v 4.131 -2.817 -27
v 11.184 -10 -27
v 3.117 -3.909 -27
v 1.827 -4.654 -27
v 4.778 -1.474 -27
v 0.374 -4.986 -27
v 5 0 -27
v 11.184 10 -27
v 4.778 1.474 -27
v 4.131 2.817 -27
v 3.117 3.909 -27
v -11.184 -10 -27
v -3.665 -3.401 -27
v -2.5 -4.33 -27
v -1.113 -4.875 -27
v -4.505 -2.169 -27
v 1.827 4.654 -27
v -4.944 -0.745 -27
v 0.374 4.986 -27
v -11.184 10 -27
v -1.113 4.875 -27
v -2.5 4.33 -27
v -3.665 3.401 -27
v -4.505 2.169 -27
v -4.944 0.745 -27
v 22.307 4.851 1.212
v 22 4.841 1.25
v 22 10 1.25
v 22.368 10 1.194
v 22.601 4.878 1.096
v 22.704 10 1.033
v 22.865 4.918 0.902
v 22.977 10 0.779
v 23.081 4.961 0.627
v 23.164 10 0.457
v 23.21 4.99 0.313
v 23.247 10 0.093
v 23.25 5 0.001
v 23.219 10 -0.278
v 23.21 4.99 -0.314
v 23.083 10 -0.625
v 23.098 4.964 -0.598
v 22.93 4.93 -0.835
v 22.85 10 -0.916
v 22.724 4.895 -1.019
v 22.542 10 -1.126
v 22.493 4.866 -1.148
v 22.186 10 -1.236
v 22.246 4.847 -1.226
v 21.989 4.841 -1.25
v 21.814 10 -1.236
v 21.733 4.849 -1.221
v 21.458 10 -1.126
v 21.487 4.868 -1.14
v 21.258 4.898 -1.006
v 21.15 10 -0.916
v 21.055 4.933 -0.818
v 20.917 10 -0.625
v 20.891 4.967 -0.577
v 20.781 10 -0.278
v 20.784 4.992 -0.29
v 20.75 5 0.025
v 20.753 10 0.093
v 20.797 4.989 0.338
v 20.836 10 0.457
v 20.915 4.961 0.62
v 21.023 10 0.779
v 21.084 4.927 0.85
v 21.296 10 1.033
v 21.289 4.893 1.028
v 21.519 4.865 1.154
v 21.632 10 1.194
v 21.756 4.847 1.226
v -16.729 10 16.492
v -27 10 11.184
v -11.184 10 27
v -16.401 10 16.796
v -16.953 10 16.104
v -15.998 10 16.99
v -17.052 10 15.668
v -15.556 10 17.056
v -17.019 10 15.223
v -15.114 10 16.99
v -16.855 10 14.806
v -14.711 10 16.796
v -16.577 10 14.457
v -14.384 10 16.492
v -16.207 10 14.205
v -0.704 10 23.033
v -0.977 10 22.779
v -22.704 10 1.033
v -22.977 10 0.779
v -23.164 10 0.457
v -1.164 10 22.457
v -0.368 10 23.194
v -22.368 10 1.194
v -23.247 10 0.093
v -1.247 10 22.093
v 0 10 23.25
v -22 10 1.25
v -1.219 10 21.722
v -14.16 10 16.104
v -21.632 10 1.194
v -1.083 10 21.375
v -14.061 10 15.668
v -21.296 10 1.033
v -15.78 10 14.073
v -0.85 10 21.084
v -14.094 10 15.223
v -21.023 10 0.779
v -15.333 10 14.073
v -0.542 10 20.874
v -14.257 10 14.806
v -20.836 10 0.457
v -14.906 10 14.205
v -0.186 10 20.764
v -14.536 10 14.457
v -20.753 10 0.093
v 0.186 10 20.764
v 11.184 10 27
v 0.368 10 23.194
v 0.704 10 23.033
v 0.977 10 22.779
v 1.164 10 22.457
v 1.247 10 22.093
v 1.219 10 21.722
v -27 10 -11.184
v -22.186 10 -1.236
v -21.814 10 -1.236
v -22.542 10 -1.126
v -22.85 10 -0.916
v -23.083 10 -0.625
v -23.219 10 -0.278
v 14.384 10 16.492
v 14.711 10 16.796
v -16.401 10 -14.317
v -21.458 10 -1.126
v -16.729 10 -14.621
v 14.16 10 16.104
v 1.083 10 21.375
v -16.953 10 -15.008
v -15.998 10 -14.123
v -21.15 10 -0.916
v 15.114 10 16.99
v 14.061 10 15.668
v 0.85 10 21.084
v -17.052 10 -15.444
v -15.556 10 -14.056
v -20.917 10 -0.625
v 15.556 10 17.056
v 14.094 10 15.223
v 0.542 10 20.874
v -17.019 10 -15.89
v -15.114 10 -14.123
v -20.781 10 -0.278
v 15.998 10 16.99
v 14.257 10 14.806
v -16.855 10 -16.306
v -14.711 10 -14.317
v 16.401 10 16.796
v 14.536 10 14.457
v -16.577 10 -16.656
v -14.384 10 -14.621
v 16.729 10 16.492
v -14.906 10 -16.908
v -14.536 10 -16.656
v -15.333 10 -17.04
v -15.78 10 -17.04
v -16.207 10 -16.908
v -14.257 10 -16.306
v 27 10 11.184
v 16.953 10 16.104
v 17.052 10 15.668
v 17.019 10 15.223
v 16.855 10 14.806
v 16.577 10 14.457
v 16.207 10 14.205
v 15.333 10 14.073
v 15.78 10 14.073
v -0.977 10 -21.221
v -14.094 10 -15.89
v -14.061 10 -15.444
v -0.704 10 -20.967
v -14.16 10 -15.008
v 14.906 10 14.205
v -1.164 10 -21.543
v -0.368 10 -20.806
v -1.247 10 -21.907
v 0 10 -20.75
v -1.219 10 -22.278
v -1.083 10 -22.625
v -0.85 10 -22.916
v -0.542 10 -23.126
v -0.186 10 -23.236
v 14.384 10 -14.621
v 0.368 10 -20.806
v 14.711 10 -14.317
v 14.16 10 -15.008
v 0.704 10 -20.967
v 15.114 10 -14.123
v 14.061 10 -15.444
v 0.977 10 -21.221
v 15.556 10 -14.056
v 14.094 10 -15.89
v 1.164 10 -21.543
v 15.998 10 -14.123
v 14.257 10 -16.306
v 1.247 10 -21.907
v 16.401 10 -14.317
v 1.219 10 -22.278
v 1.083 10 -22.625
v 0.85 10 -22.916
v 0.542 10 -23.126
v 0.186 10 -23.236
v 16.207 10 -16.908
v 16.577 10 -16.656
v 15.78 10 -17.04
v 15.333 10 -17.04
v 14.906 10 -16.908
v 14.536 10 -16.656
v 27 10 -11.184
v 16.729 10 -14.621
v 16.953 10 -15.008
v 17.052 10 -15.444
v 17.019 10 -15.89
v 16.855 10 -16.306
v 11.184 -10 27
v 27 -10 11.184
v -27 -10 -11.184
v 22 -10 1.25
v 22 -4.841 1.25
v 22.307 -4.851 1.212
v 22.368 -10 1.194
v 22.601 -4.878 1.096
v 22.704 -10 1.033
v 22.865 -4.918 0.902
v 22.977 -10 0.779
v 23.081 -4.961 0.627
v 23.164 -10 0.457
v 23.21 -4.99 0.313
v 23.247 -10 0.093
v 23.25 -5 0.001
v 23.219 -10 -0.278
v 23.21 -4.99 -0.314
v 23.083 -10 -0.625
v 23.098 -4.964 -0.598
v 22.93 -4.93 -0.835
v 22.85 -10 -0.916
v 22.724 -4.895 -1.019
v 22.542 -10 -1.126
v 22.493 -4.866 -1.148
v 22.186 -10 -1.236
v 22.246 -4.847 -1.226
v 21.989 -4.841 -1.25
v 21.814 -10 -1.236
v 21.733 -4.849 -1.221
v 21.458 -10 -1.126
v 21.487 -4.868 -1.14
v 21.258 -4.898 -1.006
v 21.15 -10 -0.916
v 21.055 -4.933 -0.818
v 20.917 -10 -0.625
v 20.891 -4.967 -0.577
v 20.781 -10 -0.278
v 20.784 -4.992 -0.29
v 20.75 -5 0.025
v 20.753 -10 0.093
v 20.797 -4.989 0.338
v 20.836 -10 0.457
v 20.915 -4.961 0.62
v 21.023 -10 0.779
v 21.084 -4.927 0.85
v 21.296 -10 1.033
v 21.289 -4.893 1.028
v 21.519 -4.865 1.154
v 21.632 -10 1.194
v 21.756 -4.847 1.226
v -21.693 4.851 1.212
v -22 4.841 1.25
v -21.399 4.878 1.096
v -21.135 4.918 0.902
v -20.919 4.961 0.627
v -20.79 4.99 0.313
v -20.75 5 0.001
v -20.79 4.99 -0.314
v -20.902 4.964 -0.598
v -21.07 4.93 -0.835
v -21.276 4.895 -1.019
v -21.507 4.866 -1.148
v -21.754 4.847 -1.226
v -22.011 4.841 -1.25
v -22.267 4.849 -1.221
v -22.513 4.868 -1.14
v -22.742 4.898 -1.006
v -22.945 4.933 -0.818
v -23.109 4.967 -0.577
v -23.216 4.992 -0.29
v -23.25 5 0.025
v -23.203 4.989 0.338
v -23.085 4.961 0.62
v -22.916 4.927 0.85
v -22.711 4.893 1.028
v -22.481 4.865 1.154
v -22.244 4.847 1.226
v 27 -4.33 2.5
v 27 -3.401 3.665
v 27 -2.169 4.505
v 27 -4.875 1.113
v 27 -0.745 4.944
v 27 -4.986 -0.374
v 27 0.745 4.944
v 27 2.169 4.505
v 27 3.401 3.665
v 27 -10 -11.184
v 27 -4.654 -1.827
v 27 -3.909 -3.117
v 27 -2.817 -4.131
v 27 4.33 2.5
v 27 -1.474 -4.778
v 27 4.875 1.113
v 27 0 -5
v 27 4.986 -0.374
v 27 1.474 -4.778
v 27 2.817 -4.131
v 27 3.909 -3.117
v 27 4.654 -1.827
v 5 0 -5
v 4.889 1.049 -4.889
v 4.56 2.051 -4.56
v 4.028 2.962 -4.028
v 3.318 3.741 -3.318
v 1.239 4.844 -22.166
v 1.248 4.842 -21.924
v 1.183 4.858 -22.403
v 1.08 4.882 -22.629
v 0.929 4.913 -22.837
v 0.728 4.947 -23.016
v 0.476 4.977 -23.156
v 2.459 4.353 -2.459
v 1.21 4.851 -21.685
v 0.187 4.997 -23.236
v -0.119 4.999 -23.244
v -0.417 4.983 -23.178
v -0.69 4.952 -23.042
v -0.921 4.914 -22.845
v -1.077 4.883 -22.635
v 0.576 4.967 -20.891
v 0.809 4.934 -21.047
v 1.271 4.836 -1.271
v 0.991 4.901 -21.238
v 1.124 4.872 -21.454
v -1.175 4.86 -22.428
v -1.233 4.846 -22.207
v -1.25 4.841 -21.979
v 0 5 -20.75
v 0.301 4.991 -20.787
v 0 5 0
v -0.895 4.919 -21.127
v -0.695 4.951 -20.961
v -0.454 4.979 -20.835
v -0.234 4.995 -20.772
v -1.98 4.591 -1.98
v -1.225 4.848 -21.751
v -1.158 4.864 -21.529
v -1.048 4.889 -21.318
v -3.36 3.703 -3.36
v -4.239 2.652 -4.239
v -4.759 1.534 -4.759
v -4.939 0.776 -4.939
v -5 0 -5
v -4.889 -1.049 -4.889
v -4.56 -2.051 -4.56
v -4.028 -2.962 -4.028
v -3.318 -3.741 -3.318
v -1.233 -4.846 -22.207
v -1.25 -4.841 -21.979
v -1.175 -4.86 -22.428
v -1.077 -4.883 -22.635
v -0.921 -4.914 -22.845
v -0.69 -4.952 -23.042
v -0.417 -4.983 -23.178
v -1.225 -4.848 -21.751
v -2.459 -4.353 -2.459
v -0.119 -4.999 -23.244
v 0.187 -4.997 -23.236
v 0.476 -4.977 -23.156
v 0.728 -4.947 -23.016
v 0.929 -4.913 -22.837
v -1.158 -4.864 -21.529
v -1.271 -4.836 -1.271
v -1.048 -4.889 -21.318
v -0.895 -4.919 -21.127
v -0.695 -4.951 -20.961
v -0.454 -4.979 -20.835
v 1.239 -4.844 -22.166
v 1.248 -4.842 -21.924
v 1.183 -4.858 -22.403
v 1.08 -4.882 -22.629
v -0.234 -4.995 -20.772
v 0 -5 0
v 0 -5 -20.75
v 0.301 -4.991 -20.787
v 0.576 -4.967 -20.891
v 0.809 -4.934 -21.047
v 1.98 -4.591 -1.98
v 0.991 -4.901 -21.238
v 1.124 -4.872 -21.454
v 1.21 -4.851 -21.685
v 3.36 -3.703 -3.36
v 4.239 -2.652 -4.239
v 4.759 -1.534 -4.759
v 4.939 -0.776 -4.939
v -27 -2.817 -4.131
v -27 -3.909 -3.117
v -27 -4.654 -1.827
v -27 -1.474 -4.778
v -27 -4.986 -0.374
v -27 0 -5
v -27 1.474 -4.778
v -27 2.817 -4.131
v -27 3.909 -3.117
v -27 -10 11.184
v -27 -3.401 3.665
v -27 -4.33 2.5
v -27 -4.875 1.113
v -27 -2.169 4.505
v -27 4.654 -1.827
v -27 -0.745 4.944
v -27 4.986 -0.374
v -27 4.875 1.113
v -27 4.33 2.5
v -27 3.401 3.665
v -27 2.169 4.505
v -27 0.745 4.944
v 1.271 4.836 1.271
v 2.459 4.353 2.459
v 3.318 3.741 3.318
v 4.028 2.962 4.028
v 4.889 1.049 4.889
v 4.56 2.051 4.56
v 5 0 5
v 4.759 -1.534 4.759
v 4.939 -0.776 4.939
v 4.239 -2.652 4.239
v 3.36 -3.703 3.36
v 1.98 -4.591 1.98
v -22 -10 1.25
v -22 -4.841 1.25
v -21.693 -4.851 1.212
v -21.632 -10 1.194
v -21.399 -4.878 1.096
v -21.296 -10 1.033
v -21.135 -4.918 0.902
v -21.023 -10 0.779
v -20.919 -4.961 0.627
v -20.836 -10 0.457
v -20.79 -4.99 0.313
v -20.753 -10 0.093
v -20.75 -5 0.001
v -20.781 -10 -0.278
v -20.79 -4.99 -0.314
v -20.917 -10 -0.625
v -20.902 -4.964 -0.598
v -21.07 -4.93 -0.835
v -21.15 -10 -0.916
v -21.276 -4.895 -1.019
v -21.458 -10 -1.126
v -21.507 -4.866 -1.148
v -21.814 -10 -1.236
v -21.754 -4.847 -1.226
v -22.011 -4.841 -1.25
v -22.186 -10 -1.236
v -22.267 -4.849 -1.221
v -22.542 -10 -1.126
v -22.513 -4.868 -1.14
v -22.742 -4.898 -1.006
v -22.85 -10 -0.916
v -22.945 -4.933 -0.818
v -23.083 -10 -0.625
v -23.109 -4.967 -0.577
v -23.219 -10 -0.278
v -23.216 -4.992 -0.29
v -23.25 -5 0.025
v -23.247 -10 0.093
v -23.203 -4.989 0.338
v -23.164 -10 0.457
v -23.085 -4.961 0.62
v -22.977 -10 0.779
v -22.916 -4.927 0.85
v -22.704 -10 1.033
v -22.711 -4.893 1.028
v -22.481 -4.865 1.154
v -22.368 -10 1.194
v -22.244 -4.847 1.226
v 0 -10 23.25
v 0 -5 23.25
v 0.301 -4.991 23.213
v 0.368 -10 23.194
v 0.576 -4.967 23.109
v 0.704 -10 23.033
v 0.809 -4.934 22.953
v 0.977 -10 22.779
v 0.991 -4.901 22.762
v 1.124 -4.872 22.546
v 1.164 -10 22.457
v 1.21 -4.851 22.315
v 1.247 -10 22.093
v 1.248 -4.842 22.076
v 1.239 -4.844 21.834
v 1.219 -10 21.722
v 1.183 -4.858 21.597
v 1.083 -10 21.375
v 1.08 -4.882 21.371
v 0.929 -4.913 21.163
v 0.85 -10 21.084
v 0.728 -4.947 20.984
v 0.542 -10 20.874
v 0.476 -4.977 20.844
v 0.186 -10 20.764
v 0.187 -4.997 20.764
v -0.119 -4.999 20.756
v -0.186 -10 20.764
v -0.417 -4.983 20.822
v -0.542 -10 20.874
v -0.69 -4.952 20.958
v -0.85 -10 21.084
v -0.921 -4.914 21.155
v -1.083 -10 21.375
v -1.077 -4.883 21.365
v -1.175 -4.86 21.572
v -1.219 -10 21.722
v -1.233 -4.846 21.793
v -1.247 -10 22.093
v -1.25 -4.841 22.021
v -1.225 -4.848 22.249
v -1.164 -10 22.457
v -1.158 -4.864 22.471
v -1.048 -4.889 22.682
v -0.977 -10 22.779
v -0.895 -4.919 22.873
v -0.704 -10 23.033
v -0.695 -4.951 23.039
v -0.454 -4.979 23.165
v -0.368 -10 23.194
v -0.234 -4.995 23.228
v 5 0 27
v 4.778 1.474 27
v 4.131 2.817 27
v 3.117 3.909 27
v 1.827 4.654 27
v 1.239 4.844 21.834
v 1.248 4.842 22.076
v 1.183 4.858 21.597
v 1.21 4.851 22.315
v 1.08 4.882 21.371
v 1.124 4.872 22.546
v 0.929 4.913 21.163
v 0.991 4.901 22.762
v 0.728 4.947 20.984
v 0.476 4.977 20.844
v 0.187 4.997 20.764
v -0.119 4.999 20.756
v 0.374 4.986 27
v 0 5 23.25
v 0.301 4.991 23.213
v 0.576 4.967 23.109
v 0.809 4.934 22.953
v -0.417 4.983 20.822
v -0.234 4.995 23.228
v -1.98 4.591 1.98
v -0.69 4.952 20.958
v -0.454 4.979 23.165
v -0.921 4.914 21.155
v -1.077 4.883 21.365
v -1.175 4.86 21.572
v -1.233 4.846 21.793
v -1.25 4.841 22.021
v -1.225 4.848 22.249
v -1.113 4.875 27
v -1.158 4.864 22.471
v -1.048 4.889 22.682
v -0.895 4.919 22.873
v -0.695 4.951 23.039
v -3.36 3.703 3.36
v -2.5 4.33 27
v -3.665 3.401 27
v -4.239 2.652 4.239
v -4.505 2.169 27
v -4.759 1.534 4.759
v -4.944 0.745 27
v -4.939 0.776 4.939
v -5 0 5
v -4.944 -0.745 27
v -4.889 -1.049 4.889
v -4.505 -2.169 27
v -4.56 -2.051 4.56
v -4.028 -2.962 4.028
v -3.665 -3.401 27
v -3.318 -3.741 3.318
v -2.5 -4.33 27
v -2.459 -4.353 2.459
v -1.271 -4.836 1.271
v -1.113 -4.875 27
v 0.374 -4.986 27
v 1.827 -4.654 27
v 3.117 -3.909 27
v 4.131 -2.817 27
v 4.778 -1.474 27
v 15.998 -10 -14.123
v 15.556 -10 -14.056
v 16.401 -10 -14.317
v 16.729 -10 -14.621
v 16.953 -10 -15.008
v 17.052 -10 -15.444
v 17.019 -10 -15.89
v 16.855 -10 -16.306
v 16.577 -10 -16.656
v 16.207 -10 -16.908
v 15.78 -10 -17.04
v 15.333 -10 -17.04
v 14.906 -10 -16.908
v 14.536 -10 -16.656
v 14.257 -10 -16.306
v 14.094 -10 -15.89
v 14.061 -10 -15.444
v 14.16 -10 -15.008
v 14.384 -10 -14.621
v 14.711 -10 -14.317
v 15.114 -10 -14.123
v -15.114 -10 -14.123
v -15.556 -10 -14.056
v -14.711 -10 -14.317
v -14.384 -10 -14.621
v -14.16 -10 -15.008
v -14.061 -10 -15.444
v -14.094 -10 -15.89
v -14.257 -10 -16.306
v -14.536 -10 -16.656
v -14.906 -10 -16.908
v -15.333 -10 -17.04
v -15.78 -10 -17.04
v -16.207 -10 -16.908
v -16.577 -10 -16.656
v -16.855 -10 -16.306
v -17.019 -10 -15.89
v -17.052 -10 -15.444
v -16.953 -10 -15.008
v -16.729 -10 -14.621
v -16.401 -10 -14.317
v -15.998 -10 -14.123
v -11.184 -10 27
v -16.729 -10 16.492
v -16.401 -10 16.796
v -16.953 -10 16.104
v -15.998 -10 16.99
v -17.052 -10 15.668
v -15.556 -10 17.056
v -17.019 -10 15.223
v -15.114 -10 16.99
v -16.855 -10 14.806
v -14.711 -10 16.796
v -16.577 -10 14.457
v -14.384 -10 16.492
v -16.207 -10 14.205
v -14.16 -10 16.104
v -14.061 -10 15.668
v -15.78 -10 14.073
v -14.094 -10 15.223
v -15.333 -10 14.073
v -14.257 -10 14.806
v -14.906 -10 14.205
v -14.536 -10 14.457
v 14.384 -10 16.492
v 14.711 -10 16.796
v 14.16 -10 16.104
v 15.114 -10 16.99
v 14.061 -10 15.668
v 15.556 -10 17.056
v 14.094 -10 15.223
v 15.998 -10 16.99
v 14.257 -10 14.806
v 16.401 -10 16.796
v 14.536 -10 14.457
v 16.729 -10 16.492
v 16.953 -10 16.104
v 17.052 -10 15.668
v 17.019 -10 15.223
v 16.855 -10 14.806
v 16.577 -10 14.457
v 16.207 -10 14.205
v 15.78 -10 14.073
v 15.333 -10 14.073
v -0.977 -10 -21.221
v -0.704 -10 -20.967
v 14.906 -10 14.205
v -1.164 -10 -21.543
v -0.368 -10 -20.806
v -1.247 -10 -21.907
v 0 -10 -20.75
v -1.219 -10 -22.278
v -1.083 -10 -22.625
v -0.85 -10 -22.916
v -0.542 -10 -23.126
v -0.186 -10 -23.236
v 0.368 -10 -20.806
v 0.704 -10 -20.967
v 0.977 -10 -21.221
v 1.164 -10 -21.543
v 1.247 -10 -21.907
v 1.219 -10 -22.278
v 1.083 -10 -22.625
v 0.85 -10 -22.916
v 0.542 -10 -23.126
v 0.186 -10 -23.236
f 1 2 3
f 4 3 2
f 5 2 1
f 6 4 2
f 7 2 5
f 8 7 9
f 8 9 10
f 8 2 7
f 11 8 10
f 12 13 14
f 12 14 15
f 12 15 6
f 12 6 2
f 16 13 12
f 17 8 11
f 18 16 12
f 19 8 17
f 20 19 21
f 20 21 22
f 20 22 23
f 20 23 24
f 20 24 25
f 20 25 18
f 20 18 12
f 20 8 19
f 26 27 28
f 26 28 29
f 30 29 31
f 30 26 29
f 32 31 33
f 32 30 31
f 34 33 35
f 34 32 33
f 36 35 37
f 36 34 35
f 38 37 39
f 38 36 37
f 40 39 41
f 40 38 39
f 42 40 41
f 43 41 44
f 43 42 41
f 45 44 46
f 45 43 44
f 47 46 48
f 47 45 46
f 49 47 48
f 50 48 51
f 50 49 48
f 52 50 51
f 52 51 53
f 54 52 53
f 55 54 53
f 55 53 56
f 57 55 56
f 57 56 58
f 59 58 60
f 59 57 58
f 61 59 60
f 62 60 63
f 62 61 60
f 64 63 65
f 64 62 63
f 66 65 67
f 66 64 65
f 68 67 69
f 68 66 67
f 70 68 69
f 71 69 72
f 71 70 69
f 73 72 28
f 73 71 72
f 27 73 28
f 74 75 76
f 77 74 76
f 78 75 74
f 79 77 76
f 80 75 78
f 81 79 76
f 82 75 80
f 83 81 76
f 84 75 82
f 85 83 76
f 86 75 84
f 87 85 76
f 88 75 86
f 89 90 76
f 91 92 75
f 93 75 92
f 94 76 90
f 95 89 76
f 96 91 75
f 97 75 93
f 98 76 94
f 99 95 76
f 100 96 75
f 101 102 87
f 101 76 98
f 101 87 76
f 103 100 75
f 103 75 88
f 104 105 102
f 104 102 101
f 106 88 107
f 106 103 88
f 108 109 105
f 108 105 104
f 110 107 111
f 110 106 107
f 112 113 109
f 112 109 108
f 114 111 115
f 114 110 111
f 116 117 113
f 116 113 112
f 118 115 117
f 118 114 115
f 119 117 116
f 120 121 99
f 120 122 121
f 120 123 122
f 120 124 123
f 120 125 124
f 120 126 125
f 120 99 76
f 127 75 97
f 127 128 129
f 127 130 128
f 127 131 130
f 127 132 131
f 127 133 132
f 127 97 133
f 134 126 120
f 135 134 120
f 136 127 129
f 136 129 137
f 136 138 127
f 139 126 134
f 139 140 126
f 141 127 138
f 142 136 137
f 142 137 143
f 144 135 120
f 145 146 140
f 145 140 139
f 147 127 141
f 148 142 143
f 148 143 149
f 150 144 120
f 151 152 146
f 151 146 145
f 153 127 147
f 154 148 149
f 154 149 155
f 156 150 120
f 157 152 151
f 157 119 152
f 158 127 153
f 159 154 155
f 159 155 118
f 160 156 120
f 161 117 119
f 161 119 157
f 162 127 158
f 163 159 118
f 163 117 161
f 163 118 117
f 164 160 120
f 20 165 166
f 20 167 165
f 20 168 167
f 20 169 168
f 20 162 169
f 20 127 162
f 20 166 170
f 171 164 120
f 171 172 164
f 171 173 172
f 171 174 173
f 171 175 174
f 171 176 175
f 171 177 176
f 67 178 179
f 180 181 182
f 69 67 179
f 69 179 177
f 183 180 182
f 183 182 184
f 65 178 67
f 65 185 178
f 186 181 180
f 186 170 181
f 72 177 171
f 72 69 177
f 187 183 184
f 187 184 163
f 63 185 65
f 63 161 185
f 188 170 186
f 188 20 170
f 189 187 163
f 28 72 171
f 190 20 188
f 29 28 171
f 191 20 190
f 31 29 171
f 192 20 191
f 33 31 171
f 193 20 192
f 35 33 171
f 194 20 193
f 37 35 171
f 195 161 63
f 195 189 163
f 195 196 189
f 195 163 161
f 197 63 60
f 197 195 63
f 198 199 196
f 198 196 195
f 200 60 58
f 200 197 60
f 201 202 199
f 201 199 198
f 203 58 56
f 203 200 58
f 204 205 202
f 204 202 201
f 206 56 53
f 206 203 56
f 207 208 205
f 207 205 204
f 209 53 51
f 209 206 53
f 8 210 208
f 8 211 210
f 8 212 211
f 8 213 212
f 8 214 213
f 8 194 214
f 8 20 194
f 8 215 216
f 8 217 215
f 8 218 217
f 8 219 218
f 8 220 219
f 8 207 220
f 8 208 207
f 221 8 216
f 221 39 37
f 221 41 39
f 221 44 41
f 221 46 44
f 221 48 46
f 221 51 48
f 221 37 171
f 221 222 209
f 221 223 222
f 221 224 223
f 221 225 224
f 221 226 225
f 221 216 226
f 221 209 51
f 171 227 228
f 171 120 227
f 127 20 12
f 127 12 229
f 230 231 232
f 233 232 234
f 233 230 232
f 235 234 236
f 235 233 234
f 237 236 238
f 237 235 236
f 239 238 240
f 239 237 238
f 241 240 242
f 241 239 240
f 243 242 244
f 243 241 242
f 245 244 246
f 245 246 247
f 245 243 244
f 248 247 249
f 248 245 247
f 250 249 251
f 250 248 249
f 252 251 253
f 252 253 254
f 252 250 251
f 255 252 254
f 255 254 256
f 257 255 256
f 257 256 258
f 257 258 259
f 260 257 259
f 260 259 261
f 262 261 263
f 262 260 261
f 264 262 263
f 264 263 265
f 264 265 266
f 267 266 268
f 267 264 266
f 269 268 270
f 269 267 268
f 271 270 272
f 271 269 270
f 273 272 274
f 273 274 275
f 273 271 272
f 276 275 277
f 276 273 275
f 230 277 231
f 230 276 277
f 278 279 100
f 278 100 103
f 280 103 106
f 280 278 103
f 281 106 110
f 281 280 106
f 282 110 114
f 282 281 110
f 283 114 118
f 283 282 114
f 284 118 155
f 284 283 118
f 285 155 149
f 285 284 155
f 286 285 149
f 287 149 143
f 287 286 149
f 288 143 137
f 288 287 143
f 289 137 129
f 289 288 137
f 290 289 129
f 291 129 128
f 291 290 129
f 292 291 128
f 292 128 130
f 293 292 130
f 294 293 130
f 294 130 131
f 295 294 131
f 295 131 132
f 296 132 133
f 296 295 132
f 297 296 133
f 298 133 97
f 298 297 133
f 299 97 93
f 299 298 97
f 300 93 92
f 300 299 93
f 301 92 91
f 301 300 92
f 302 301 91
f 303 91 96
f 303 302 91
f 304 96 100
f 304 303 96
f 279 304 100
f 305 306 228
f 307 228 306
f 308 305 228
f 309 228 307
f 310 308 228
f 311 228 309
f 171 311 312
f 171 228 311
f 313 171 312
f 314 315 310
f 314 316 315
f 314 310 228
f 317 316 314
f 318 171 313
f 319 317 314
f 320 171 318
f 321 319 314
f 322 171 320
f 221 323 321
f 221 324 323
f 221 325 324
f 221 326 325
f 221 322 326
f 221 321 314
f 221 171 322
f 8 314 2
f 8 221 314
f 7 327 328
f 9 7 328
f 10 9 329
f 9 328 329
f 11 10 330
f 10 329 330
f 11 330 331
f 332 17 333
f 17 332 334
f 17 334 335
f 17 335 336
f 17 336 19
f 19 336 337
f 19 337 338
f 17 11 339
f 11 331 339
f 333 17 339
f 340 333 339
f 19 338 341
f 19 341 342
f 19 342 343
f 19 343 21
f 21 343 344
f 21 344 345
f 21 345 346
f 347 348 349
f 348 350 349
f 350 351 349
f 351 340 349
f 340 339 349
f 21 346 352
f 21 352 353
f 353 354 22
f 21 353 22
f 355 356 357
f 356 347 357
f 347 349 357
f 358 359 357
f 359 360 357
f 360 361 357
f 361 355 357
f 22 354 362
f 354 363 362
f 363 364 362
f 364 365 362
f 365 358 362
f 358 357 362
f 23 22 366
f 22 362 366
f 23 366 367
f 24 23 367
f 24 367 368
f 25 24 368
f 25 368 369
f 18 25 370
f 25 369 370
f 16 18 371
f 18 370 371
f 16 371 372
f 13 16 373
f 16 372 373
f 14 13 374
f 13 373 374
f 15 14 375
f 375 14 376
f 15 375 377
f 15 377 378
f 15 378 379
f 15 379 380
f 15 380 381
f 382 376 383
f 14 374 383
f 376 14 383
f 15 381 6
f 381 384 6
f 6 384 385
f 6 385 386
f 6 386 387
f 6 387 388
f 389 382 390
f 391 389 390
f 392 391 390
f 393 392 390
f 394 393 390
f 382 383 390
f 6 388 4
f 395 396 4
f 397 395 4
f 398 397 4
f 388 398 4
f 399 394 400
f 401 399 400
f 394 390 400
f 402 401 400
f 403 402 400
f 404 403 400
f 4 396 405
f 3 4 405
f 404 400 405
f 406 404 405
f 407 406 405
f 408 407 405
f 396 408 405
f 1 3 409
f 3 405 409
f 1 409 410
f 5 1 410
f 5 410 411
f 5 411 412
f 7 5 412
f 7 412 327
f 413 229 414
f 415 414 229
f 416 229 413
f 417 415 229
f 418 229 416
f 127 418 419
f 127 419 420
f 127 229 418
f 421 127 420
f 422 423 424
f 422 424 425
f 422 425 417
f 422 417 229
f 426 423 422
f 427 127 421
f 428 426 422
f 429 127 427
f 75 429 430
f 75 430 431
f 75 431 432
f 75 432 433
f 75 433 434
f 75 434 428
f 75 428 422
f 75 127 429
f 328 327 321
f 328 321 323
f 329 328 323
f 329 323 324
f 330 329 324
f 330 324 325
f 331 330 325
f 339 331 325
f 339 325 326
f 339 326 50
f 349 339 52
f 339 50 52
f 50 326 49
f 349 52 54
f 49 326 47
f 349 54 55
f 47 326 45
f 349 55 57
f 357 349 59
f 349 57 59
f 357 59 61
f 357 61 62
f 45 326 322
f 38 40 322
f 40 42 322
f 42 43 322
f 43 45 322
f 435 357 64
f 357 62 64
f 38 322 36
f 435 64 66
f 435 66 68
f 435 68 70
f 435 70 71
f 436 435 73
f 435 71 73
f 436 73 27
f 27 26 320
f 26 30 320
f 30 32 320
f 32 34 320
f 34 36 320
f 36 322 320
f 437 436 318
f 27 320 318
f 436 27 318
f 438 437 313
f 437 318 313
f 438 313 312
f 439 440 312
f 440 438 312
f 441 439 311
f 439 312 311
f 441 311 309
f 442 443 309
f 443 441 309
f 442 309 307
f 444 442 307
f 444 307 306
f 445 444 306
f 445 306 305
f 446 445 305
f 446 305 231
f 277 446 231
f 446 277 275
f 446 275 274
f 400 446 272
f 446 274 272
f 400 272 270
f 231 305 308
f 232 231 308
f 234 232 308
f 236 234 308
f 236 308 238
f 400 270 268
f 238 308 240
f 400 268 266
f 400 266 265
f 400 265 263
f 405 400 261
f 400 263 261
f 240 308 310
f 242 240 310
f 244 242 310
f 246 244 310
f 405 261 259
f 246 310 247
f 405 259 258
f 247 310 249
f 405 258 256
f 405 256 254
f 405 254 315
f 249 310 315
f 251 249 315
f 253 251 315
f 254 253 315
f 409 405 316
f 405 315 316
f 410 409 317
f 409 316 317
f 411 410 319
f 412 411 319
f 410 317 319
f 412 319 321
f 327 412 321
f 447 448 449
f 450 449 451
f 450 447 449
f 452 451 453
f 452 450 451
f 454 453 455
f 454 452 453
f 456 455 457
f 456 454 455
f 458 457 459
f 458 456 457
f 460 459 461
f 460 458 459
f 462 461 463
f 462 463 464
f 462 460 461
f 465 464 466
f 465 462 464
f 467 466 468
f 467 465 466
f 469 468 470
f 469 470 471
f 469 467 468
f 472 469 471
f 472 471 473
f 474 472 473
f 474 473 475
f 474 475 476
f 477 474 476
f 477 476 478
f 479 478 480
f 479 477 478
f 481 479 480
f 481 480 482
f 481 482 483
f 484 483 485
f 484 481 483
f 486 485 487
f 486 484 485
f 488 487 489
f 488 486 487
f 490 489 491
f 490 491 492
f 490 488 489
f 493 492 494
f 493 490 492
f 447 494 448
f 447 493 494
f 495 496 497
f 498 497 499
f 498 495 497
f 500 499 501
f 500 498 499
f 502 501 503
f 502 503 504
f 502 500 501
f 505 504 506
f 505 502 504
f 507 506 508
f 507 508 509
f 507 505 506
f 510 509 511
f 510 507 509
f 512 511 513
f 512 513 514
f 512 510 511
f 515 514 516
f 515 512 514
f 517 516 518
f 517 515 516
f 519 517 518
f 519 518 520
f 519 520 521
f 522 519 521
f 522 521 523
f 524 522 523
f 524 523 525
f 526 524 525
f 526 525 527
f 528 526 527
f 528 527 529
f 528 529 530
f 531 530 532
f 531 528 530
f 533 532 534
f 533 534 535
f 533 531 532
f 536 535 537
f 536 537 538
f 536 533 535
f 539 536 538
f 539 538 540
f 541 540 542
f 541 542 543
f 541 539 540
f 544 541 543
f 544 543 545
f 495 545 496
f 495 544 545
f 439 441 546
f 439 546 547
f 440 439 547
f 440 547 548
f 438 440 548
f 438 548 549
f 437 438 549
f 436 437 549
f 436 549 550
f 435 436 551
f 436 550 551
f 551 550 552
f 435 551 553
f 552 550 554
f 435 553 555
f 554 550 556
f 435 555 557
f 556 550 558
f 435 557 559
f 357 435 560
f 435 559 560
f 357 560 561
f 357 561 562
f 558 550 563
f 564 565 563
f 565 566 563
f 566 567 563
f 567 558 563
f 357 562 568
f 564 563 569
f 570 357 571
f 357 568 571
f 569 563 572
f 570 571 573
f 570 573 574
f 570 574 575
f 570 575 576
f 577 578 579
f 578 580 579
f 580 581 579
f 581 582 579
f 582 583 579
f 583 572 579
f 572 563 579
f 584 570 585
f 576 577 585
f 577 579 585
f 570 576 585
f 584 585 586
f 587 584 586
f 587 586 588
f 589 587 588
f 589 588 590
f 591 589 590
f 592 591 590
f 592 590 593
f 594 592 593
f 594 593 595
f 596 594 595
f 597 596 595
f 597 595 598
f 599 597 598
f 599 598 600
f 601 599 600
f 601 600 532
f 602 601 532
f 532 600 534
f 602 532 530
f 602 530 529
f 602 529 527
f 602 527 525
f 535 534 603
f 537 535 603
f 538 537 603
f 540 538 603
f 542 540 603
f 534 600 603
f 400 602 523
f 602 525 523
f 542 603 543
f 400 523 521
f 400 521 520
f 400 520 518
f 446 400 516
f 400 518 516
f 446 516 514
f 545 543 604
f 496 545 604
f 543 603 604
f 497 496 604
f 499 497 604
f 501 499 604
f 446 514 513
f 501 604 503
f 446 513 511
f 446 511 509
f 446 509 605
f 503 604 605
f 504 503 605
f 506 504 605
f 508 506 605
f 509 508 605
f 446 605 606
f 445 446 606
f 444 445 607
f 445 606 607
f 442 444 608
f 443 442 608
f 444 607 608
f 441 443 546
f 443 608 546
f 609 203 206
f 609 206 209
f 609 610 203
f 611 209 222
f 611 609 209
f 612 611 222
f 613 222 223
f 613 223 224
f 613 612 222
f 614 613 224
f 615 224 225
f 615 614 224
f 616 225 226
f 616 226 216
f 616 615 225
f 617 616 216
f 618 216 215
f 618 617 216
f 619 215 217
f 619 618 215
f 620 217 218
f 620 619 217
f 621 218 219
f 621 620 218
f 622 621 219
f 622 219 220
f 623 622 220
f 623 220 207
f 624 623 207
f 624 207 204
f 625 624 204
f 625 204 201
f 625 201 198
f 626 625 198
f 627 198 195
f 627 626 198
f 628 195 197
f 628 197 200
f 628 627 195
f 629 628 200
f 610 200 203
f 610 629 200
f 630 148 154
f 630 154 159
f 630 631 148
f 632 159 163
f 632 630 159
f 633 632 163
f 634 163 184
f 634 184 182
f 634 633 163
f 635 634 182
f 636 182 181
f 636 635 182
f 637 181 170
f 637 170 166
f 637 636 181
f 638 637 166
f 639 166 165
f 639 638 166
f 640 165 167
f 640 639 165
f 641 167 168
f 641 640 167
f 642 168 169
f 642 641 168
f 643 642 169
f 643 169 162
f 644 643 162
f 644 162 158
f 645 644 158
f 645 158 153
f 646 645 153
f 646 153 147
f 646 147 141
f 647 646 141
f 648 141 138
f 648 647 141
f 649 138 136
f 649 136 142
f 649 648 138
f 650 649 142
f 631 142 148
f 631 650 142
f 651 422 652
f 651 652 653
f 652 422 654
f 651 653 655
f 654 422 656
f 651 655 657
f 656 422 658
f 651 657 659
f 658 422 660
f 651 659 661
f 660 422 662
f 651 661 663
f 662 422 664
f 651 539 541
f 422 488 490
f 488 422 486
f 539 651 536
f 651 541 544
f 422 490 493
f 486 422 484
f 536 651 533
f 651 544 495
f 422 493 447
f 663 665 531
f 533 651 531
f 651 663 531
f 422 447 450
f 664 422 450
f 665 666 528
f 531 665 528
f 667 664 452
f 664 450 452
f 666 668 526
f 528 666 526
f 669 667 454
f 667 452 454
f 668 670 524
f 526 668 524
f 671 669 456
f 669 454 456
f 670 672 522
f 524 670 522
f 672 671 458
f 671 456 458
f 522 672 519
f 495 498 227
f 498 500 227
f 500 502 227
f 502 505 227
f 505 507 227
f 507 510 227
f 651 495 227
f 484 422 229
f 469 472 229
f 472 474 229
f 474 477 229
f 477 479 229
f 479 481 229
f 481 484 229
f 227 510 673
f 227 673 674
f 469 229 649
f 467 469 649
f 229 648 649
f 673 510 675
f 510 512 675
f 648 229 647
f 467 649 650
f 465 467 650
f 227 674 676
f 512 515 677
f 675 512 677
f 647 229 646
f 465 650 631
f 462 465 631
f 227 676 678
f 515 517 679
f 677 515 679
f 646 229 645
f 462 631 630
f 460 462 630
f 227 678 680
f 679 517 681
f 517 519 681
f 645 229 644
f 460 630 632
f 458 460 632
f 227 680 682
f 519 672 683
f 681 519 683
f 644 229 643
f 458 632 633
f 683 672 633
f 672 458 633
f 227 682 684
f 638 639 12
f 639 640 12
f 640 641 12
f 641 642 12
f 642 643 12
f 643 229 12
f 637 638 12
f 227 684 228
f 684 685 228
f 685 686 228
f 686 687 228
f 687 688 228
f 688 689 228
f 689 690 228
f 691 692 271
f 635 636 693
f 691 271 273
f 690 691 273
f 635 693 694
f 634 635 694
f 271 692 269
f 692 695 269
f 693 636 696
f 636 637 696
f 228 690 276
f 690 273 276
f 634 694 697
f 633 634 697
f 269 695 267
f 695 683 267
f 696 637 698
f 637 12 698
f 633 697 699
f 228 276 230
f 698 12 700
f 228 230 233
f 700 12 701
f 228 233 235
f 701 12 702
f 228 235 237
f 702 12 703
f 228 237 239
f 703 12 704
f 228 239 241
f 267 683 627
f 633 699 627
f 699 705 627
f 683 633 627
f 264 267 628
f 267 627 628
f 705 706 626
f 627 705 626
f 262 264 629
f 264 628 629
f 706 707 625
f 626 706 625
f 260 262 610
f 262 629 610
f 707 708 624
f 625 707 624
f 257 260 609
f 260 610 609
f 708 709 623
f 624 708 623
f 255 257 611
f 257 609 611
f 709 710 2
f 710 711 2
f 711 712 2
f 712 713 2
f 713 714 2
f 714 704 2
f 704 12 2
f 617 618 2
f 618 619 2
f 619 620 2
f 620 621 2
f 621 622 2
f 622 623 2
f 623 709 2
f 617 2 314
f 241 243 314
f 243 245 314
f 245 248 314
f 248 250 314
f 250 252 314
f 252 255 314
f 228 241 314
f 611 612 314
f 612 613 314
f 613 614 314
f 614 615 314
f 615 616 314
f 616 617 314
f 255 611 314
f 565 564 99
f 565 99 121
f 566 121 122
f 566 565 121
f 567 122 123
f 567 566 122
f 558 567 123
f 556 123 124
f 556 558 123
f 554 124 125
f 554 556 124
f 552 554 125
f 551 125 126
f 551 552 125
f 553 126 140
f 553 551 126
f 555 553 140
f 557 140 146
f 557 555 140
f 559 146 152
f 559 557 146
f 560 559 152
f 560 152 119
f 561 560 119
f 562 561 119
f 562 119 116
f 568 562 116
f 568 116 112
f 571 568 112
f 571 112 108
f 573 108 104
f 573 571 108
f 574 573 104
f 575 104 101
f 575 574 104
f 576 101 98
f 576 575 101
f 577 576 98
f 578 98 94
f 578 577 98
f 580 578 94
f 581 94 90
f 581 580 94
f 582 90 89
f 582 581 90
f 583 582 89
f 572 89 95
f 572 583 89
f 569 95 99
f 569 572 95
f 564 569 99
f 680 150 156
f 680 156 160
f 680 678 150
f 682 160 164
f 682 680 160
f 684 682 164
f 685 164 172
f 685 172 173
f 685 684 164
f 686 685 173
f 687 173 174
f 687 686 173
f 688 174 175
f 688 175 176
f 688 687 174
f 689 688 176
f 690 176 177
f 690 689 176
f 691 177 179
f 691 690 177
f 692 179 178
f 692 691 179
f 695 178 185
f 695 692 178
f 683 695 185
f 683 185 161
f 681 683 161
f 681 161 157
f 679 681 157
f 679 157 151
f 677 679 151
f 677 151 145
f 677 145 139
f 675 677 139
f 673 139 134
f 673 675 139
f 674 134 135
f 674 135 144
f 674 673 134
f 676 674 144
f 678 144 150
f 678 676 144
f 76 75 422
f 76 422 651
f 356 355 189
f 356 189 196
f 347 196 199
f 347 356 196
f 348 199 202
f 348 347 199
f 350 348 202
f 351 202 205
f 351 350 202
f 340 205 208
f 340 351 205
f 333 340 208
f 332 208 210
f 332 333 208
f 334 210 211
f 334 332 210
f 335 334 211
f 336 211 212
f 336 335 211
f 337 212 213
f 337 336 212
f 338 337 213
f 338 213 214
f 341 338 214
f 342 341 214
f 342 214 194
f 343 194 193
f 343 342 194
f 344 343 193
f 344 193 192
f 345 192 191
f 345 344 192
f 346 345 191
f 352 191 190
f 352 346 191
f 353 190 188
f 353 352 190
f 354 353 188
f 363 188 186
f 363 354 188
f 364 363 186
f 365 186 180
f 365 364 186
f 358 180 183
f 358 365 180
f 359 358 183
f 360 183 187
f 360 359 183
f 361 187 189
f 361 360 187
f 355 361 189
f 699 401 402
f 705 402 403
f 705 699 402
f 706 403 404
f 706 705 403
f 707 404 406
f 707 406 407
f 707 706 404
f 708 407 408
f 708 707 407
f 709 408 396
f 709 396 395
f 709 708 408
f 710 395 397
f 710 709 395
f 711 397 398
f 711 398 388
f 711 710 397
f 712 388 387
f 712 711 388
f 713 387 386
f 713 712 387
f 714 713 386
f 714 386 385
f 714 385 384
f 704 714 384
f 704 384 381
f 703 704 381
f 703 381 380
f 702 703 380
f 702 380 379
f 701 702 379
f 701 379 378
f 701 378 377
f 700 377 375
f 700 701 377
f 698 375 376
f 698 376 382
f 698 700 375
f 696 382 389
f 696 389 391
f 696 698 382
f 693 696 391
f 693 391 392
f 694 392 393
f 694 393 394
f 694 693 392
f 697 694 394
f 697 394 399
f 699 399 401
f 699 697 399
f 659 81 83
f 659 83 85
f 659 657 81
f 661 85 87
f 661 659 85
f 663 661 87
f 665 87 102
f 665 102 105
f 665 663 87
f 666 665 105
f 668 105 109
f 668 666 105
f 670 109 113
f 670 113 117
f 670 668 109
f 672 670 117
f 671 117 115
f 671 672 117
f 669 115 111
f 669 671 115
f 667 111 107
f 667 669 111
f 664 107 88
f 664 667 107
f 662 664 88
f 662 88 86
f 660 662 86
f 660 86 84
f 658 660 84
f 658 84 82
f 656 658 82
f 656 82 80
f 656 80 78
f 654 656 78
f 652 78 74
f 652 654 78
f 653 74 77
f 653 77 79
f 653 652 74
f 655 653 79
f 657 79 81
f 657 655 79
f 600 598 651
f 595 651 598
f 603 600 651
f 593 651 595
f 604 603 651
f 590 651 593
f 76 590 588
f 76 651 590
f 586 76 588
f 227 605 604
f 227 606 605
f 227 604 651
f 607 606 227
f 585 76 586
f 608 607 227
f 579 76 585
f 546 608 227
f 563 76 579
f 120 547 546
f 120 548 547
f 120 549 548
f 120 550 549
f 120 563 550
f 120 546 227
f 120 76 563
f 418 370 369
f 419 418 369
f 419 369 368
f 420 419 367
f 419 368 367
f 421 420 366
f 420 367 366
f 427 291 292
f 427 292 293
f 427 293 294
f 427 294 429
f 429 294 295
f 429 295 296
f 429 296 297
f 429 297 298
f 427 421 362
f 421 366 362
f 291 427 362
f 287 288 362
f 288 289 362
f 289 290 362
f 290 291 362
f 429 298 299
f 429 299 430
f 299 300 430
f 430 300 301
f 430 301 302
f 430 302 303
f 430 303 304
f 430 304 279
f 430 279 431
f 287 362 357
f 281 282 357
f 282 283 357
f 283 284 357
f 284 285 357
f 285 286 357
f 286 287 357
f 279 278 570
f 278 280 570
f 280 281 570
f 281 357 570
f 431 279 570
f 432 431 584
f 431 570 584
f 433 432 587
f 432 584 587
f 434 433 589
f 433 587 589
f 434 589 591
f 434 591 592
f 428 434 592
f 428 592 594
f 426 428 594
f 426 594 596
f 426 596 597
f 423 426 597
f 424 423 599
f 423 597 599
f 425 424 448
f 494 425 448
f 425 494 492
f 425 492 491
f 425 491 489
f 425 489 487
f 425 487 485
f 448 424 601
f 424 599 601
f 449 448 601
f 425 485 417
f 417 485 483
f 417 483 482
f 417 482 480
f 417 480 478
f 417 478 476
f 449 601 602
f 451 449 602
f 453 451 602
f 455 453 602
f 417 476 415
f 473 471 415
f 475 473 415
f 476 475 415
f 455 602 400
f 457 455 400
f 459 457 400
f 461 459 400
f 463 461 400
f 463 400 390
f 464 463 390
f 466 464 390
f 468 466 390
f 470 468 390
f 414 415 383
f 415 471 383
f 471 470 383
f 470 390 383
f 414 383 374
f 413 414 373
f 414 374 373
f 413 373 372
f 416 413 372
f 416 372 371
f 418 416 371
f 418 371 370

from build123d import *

# Parameters (mm, degrees)
SKETCH1_R           = 1.25
SKETCH1_R_2         = 1.5
BOSS_EXTRUDE1_DEPTH = 10
CUT_EXTRUDE4_REACH  = 63.196
SKETCH7_R           = 5
CUT_EXTRUDE5_REACH  = 63.196
SKETCH8_R           = 5


with BuildPart() as part:
    # Sketch1 → Boss-Extrude1 (new, symmetric)
    with BuildSketch(Plane(origin=(0, 0, 0), x_dir=(1, 0, 0), z_dir=(0, 1, 0))):
        Polygon((11.183766184, 27), (-11.183766184, 27), (-27, 11.183766184), (-27, -11.183766184), (-11.183766184, -27), (11.183766184, -27), (27, -11.183766184), (27, 11.183766184), align=None)
        with Locations(Location((0, 22, 0), (0, 0, 270))):
            Circle(SKETCH1_R, mode=Mode.SUBTRACT)
        with Locations(Location((15.556349186, 15.556349186, 0), (0, 0, 270))):
            Circle(SKETCH1_R_2, mode=Mode.SUBTRACT)
        with Locations(Location((22, 0, 0), (0, 0, 270))):
            Circle(SKETCH1_R, mode=Mode.SUBTRACT)
        with Locations(Location((15.556349186, -15.556349186, 0), (0, 0, 270))):
            Circle(SKETCH1_R_2, mode=Mode.SUBTRACT)
        with Locations(Location((0, -22, 0), (0, 0, 270))):
            Circle(SKETCH1_R, mode=Mode.SUBTRACT)
        with Locations(Location((-15.556349186, -15.556349186, 0), (0, 0, 270))):
            Circle(SKETCH1_R_2, mode=Mode.SUBTRACT)
        with Locations(Location((-22, 0, 0), (0, 0, 270))):
            Circle(SKETCH1_R, mode=Mode.SUBTRACT)
        with Locations(Location((-15.556349186, 15.556349186, 0), (0, 0, 270))):
            Circle(SKETCH1_R_2, mode=Mode.SUBTRACT)
    extrude(amount=BOSS_EXTRUDE1_DEPTH, both=True)

    # Cut-Extrude4: up to this face of the body (flat: up to its plane)
    cut_extrude4_end = Plane(part.part.faces().sort_by_distance((0, 0, -27))[0])
    # Sketch7 → Cut-Extrude4 (cut, up to the picked face)
    with BuildSketch(Plane.XY.offset(27), mode=Mode.PRIVATE) as cut_extrude4_sk1:
        Circle(SKETCH7_R)
    cut_extrude4_tool1 = split(extrude(cut_extrude4_sk1.sketch, amount=-CUT_EXTRUDE4_REACH, mode=Mode.PRIVATE), bisect_by=cut_extrude4_end, keep=Keep.BOTH, mode=Mode.PRIVATE)
    add(cut_extrude4_tool1.solids().sort_by(Axis((0, 0, 27), (0, 0, -1)))[0], mode=Mode.SUBTRACT)

    # Cut-Extrude5: up to this face of the body (flat: up to its plane)
    cut_extrude5_end = Plane(part.part.faces().sort_by_distance((-27, 0, 0))[0])
    # Sketch8 → Cut-Extrude5 (cut, up to the picked face)
    with BuildSketch(Plane(origin=(27, 0, 0), x_dir=(0, 0, -1), z_dir=(1, 0, 0)), mode=Mode.PRIVATE) as cut_extrude5_sk1:
        Circle(SKETCH8_R)
    cut_extrude5_tool1 = split(extrude(cut_extrude5_sk1.sketch, amount=-CUT_EXTRUDE5_REACH, mode=Mode.PRIVATE), bisect_by=cut_extrude5_end, keep=Keep.BOTH, mode=Mode.PRIVATE)
    add(cut_extrude5_tool1.solids().sort_by(Axis((27, 0, 0), (-1, 0, 0)))[0], mode=Mode.SUBTRACT)


solid = part.part
